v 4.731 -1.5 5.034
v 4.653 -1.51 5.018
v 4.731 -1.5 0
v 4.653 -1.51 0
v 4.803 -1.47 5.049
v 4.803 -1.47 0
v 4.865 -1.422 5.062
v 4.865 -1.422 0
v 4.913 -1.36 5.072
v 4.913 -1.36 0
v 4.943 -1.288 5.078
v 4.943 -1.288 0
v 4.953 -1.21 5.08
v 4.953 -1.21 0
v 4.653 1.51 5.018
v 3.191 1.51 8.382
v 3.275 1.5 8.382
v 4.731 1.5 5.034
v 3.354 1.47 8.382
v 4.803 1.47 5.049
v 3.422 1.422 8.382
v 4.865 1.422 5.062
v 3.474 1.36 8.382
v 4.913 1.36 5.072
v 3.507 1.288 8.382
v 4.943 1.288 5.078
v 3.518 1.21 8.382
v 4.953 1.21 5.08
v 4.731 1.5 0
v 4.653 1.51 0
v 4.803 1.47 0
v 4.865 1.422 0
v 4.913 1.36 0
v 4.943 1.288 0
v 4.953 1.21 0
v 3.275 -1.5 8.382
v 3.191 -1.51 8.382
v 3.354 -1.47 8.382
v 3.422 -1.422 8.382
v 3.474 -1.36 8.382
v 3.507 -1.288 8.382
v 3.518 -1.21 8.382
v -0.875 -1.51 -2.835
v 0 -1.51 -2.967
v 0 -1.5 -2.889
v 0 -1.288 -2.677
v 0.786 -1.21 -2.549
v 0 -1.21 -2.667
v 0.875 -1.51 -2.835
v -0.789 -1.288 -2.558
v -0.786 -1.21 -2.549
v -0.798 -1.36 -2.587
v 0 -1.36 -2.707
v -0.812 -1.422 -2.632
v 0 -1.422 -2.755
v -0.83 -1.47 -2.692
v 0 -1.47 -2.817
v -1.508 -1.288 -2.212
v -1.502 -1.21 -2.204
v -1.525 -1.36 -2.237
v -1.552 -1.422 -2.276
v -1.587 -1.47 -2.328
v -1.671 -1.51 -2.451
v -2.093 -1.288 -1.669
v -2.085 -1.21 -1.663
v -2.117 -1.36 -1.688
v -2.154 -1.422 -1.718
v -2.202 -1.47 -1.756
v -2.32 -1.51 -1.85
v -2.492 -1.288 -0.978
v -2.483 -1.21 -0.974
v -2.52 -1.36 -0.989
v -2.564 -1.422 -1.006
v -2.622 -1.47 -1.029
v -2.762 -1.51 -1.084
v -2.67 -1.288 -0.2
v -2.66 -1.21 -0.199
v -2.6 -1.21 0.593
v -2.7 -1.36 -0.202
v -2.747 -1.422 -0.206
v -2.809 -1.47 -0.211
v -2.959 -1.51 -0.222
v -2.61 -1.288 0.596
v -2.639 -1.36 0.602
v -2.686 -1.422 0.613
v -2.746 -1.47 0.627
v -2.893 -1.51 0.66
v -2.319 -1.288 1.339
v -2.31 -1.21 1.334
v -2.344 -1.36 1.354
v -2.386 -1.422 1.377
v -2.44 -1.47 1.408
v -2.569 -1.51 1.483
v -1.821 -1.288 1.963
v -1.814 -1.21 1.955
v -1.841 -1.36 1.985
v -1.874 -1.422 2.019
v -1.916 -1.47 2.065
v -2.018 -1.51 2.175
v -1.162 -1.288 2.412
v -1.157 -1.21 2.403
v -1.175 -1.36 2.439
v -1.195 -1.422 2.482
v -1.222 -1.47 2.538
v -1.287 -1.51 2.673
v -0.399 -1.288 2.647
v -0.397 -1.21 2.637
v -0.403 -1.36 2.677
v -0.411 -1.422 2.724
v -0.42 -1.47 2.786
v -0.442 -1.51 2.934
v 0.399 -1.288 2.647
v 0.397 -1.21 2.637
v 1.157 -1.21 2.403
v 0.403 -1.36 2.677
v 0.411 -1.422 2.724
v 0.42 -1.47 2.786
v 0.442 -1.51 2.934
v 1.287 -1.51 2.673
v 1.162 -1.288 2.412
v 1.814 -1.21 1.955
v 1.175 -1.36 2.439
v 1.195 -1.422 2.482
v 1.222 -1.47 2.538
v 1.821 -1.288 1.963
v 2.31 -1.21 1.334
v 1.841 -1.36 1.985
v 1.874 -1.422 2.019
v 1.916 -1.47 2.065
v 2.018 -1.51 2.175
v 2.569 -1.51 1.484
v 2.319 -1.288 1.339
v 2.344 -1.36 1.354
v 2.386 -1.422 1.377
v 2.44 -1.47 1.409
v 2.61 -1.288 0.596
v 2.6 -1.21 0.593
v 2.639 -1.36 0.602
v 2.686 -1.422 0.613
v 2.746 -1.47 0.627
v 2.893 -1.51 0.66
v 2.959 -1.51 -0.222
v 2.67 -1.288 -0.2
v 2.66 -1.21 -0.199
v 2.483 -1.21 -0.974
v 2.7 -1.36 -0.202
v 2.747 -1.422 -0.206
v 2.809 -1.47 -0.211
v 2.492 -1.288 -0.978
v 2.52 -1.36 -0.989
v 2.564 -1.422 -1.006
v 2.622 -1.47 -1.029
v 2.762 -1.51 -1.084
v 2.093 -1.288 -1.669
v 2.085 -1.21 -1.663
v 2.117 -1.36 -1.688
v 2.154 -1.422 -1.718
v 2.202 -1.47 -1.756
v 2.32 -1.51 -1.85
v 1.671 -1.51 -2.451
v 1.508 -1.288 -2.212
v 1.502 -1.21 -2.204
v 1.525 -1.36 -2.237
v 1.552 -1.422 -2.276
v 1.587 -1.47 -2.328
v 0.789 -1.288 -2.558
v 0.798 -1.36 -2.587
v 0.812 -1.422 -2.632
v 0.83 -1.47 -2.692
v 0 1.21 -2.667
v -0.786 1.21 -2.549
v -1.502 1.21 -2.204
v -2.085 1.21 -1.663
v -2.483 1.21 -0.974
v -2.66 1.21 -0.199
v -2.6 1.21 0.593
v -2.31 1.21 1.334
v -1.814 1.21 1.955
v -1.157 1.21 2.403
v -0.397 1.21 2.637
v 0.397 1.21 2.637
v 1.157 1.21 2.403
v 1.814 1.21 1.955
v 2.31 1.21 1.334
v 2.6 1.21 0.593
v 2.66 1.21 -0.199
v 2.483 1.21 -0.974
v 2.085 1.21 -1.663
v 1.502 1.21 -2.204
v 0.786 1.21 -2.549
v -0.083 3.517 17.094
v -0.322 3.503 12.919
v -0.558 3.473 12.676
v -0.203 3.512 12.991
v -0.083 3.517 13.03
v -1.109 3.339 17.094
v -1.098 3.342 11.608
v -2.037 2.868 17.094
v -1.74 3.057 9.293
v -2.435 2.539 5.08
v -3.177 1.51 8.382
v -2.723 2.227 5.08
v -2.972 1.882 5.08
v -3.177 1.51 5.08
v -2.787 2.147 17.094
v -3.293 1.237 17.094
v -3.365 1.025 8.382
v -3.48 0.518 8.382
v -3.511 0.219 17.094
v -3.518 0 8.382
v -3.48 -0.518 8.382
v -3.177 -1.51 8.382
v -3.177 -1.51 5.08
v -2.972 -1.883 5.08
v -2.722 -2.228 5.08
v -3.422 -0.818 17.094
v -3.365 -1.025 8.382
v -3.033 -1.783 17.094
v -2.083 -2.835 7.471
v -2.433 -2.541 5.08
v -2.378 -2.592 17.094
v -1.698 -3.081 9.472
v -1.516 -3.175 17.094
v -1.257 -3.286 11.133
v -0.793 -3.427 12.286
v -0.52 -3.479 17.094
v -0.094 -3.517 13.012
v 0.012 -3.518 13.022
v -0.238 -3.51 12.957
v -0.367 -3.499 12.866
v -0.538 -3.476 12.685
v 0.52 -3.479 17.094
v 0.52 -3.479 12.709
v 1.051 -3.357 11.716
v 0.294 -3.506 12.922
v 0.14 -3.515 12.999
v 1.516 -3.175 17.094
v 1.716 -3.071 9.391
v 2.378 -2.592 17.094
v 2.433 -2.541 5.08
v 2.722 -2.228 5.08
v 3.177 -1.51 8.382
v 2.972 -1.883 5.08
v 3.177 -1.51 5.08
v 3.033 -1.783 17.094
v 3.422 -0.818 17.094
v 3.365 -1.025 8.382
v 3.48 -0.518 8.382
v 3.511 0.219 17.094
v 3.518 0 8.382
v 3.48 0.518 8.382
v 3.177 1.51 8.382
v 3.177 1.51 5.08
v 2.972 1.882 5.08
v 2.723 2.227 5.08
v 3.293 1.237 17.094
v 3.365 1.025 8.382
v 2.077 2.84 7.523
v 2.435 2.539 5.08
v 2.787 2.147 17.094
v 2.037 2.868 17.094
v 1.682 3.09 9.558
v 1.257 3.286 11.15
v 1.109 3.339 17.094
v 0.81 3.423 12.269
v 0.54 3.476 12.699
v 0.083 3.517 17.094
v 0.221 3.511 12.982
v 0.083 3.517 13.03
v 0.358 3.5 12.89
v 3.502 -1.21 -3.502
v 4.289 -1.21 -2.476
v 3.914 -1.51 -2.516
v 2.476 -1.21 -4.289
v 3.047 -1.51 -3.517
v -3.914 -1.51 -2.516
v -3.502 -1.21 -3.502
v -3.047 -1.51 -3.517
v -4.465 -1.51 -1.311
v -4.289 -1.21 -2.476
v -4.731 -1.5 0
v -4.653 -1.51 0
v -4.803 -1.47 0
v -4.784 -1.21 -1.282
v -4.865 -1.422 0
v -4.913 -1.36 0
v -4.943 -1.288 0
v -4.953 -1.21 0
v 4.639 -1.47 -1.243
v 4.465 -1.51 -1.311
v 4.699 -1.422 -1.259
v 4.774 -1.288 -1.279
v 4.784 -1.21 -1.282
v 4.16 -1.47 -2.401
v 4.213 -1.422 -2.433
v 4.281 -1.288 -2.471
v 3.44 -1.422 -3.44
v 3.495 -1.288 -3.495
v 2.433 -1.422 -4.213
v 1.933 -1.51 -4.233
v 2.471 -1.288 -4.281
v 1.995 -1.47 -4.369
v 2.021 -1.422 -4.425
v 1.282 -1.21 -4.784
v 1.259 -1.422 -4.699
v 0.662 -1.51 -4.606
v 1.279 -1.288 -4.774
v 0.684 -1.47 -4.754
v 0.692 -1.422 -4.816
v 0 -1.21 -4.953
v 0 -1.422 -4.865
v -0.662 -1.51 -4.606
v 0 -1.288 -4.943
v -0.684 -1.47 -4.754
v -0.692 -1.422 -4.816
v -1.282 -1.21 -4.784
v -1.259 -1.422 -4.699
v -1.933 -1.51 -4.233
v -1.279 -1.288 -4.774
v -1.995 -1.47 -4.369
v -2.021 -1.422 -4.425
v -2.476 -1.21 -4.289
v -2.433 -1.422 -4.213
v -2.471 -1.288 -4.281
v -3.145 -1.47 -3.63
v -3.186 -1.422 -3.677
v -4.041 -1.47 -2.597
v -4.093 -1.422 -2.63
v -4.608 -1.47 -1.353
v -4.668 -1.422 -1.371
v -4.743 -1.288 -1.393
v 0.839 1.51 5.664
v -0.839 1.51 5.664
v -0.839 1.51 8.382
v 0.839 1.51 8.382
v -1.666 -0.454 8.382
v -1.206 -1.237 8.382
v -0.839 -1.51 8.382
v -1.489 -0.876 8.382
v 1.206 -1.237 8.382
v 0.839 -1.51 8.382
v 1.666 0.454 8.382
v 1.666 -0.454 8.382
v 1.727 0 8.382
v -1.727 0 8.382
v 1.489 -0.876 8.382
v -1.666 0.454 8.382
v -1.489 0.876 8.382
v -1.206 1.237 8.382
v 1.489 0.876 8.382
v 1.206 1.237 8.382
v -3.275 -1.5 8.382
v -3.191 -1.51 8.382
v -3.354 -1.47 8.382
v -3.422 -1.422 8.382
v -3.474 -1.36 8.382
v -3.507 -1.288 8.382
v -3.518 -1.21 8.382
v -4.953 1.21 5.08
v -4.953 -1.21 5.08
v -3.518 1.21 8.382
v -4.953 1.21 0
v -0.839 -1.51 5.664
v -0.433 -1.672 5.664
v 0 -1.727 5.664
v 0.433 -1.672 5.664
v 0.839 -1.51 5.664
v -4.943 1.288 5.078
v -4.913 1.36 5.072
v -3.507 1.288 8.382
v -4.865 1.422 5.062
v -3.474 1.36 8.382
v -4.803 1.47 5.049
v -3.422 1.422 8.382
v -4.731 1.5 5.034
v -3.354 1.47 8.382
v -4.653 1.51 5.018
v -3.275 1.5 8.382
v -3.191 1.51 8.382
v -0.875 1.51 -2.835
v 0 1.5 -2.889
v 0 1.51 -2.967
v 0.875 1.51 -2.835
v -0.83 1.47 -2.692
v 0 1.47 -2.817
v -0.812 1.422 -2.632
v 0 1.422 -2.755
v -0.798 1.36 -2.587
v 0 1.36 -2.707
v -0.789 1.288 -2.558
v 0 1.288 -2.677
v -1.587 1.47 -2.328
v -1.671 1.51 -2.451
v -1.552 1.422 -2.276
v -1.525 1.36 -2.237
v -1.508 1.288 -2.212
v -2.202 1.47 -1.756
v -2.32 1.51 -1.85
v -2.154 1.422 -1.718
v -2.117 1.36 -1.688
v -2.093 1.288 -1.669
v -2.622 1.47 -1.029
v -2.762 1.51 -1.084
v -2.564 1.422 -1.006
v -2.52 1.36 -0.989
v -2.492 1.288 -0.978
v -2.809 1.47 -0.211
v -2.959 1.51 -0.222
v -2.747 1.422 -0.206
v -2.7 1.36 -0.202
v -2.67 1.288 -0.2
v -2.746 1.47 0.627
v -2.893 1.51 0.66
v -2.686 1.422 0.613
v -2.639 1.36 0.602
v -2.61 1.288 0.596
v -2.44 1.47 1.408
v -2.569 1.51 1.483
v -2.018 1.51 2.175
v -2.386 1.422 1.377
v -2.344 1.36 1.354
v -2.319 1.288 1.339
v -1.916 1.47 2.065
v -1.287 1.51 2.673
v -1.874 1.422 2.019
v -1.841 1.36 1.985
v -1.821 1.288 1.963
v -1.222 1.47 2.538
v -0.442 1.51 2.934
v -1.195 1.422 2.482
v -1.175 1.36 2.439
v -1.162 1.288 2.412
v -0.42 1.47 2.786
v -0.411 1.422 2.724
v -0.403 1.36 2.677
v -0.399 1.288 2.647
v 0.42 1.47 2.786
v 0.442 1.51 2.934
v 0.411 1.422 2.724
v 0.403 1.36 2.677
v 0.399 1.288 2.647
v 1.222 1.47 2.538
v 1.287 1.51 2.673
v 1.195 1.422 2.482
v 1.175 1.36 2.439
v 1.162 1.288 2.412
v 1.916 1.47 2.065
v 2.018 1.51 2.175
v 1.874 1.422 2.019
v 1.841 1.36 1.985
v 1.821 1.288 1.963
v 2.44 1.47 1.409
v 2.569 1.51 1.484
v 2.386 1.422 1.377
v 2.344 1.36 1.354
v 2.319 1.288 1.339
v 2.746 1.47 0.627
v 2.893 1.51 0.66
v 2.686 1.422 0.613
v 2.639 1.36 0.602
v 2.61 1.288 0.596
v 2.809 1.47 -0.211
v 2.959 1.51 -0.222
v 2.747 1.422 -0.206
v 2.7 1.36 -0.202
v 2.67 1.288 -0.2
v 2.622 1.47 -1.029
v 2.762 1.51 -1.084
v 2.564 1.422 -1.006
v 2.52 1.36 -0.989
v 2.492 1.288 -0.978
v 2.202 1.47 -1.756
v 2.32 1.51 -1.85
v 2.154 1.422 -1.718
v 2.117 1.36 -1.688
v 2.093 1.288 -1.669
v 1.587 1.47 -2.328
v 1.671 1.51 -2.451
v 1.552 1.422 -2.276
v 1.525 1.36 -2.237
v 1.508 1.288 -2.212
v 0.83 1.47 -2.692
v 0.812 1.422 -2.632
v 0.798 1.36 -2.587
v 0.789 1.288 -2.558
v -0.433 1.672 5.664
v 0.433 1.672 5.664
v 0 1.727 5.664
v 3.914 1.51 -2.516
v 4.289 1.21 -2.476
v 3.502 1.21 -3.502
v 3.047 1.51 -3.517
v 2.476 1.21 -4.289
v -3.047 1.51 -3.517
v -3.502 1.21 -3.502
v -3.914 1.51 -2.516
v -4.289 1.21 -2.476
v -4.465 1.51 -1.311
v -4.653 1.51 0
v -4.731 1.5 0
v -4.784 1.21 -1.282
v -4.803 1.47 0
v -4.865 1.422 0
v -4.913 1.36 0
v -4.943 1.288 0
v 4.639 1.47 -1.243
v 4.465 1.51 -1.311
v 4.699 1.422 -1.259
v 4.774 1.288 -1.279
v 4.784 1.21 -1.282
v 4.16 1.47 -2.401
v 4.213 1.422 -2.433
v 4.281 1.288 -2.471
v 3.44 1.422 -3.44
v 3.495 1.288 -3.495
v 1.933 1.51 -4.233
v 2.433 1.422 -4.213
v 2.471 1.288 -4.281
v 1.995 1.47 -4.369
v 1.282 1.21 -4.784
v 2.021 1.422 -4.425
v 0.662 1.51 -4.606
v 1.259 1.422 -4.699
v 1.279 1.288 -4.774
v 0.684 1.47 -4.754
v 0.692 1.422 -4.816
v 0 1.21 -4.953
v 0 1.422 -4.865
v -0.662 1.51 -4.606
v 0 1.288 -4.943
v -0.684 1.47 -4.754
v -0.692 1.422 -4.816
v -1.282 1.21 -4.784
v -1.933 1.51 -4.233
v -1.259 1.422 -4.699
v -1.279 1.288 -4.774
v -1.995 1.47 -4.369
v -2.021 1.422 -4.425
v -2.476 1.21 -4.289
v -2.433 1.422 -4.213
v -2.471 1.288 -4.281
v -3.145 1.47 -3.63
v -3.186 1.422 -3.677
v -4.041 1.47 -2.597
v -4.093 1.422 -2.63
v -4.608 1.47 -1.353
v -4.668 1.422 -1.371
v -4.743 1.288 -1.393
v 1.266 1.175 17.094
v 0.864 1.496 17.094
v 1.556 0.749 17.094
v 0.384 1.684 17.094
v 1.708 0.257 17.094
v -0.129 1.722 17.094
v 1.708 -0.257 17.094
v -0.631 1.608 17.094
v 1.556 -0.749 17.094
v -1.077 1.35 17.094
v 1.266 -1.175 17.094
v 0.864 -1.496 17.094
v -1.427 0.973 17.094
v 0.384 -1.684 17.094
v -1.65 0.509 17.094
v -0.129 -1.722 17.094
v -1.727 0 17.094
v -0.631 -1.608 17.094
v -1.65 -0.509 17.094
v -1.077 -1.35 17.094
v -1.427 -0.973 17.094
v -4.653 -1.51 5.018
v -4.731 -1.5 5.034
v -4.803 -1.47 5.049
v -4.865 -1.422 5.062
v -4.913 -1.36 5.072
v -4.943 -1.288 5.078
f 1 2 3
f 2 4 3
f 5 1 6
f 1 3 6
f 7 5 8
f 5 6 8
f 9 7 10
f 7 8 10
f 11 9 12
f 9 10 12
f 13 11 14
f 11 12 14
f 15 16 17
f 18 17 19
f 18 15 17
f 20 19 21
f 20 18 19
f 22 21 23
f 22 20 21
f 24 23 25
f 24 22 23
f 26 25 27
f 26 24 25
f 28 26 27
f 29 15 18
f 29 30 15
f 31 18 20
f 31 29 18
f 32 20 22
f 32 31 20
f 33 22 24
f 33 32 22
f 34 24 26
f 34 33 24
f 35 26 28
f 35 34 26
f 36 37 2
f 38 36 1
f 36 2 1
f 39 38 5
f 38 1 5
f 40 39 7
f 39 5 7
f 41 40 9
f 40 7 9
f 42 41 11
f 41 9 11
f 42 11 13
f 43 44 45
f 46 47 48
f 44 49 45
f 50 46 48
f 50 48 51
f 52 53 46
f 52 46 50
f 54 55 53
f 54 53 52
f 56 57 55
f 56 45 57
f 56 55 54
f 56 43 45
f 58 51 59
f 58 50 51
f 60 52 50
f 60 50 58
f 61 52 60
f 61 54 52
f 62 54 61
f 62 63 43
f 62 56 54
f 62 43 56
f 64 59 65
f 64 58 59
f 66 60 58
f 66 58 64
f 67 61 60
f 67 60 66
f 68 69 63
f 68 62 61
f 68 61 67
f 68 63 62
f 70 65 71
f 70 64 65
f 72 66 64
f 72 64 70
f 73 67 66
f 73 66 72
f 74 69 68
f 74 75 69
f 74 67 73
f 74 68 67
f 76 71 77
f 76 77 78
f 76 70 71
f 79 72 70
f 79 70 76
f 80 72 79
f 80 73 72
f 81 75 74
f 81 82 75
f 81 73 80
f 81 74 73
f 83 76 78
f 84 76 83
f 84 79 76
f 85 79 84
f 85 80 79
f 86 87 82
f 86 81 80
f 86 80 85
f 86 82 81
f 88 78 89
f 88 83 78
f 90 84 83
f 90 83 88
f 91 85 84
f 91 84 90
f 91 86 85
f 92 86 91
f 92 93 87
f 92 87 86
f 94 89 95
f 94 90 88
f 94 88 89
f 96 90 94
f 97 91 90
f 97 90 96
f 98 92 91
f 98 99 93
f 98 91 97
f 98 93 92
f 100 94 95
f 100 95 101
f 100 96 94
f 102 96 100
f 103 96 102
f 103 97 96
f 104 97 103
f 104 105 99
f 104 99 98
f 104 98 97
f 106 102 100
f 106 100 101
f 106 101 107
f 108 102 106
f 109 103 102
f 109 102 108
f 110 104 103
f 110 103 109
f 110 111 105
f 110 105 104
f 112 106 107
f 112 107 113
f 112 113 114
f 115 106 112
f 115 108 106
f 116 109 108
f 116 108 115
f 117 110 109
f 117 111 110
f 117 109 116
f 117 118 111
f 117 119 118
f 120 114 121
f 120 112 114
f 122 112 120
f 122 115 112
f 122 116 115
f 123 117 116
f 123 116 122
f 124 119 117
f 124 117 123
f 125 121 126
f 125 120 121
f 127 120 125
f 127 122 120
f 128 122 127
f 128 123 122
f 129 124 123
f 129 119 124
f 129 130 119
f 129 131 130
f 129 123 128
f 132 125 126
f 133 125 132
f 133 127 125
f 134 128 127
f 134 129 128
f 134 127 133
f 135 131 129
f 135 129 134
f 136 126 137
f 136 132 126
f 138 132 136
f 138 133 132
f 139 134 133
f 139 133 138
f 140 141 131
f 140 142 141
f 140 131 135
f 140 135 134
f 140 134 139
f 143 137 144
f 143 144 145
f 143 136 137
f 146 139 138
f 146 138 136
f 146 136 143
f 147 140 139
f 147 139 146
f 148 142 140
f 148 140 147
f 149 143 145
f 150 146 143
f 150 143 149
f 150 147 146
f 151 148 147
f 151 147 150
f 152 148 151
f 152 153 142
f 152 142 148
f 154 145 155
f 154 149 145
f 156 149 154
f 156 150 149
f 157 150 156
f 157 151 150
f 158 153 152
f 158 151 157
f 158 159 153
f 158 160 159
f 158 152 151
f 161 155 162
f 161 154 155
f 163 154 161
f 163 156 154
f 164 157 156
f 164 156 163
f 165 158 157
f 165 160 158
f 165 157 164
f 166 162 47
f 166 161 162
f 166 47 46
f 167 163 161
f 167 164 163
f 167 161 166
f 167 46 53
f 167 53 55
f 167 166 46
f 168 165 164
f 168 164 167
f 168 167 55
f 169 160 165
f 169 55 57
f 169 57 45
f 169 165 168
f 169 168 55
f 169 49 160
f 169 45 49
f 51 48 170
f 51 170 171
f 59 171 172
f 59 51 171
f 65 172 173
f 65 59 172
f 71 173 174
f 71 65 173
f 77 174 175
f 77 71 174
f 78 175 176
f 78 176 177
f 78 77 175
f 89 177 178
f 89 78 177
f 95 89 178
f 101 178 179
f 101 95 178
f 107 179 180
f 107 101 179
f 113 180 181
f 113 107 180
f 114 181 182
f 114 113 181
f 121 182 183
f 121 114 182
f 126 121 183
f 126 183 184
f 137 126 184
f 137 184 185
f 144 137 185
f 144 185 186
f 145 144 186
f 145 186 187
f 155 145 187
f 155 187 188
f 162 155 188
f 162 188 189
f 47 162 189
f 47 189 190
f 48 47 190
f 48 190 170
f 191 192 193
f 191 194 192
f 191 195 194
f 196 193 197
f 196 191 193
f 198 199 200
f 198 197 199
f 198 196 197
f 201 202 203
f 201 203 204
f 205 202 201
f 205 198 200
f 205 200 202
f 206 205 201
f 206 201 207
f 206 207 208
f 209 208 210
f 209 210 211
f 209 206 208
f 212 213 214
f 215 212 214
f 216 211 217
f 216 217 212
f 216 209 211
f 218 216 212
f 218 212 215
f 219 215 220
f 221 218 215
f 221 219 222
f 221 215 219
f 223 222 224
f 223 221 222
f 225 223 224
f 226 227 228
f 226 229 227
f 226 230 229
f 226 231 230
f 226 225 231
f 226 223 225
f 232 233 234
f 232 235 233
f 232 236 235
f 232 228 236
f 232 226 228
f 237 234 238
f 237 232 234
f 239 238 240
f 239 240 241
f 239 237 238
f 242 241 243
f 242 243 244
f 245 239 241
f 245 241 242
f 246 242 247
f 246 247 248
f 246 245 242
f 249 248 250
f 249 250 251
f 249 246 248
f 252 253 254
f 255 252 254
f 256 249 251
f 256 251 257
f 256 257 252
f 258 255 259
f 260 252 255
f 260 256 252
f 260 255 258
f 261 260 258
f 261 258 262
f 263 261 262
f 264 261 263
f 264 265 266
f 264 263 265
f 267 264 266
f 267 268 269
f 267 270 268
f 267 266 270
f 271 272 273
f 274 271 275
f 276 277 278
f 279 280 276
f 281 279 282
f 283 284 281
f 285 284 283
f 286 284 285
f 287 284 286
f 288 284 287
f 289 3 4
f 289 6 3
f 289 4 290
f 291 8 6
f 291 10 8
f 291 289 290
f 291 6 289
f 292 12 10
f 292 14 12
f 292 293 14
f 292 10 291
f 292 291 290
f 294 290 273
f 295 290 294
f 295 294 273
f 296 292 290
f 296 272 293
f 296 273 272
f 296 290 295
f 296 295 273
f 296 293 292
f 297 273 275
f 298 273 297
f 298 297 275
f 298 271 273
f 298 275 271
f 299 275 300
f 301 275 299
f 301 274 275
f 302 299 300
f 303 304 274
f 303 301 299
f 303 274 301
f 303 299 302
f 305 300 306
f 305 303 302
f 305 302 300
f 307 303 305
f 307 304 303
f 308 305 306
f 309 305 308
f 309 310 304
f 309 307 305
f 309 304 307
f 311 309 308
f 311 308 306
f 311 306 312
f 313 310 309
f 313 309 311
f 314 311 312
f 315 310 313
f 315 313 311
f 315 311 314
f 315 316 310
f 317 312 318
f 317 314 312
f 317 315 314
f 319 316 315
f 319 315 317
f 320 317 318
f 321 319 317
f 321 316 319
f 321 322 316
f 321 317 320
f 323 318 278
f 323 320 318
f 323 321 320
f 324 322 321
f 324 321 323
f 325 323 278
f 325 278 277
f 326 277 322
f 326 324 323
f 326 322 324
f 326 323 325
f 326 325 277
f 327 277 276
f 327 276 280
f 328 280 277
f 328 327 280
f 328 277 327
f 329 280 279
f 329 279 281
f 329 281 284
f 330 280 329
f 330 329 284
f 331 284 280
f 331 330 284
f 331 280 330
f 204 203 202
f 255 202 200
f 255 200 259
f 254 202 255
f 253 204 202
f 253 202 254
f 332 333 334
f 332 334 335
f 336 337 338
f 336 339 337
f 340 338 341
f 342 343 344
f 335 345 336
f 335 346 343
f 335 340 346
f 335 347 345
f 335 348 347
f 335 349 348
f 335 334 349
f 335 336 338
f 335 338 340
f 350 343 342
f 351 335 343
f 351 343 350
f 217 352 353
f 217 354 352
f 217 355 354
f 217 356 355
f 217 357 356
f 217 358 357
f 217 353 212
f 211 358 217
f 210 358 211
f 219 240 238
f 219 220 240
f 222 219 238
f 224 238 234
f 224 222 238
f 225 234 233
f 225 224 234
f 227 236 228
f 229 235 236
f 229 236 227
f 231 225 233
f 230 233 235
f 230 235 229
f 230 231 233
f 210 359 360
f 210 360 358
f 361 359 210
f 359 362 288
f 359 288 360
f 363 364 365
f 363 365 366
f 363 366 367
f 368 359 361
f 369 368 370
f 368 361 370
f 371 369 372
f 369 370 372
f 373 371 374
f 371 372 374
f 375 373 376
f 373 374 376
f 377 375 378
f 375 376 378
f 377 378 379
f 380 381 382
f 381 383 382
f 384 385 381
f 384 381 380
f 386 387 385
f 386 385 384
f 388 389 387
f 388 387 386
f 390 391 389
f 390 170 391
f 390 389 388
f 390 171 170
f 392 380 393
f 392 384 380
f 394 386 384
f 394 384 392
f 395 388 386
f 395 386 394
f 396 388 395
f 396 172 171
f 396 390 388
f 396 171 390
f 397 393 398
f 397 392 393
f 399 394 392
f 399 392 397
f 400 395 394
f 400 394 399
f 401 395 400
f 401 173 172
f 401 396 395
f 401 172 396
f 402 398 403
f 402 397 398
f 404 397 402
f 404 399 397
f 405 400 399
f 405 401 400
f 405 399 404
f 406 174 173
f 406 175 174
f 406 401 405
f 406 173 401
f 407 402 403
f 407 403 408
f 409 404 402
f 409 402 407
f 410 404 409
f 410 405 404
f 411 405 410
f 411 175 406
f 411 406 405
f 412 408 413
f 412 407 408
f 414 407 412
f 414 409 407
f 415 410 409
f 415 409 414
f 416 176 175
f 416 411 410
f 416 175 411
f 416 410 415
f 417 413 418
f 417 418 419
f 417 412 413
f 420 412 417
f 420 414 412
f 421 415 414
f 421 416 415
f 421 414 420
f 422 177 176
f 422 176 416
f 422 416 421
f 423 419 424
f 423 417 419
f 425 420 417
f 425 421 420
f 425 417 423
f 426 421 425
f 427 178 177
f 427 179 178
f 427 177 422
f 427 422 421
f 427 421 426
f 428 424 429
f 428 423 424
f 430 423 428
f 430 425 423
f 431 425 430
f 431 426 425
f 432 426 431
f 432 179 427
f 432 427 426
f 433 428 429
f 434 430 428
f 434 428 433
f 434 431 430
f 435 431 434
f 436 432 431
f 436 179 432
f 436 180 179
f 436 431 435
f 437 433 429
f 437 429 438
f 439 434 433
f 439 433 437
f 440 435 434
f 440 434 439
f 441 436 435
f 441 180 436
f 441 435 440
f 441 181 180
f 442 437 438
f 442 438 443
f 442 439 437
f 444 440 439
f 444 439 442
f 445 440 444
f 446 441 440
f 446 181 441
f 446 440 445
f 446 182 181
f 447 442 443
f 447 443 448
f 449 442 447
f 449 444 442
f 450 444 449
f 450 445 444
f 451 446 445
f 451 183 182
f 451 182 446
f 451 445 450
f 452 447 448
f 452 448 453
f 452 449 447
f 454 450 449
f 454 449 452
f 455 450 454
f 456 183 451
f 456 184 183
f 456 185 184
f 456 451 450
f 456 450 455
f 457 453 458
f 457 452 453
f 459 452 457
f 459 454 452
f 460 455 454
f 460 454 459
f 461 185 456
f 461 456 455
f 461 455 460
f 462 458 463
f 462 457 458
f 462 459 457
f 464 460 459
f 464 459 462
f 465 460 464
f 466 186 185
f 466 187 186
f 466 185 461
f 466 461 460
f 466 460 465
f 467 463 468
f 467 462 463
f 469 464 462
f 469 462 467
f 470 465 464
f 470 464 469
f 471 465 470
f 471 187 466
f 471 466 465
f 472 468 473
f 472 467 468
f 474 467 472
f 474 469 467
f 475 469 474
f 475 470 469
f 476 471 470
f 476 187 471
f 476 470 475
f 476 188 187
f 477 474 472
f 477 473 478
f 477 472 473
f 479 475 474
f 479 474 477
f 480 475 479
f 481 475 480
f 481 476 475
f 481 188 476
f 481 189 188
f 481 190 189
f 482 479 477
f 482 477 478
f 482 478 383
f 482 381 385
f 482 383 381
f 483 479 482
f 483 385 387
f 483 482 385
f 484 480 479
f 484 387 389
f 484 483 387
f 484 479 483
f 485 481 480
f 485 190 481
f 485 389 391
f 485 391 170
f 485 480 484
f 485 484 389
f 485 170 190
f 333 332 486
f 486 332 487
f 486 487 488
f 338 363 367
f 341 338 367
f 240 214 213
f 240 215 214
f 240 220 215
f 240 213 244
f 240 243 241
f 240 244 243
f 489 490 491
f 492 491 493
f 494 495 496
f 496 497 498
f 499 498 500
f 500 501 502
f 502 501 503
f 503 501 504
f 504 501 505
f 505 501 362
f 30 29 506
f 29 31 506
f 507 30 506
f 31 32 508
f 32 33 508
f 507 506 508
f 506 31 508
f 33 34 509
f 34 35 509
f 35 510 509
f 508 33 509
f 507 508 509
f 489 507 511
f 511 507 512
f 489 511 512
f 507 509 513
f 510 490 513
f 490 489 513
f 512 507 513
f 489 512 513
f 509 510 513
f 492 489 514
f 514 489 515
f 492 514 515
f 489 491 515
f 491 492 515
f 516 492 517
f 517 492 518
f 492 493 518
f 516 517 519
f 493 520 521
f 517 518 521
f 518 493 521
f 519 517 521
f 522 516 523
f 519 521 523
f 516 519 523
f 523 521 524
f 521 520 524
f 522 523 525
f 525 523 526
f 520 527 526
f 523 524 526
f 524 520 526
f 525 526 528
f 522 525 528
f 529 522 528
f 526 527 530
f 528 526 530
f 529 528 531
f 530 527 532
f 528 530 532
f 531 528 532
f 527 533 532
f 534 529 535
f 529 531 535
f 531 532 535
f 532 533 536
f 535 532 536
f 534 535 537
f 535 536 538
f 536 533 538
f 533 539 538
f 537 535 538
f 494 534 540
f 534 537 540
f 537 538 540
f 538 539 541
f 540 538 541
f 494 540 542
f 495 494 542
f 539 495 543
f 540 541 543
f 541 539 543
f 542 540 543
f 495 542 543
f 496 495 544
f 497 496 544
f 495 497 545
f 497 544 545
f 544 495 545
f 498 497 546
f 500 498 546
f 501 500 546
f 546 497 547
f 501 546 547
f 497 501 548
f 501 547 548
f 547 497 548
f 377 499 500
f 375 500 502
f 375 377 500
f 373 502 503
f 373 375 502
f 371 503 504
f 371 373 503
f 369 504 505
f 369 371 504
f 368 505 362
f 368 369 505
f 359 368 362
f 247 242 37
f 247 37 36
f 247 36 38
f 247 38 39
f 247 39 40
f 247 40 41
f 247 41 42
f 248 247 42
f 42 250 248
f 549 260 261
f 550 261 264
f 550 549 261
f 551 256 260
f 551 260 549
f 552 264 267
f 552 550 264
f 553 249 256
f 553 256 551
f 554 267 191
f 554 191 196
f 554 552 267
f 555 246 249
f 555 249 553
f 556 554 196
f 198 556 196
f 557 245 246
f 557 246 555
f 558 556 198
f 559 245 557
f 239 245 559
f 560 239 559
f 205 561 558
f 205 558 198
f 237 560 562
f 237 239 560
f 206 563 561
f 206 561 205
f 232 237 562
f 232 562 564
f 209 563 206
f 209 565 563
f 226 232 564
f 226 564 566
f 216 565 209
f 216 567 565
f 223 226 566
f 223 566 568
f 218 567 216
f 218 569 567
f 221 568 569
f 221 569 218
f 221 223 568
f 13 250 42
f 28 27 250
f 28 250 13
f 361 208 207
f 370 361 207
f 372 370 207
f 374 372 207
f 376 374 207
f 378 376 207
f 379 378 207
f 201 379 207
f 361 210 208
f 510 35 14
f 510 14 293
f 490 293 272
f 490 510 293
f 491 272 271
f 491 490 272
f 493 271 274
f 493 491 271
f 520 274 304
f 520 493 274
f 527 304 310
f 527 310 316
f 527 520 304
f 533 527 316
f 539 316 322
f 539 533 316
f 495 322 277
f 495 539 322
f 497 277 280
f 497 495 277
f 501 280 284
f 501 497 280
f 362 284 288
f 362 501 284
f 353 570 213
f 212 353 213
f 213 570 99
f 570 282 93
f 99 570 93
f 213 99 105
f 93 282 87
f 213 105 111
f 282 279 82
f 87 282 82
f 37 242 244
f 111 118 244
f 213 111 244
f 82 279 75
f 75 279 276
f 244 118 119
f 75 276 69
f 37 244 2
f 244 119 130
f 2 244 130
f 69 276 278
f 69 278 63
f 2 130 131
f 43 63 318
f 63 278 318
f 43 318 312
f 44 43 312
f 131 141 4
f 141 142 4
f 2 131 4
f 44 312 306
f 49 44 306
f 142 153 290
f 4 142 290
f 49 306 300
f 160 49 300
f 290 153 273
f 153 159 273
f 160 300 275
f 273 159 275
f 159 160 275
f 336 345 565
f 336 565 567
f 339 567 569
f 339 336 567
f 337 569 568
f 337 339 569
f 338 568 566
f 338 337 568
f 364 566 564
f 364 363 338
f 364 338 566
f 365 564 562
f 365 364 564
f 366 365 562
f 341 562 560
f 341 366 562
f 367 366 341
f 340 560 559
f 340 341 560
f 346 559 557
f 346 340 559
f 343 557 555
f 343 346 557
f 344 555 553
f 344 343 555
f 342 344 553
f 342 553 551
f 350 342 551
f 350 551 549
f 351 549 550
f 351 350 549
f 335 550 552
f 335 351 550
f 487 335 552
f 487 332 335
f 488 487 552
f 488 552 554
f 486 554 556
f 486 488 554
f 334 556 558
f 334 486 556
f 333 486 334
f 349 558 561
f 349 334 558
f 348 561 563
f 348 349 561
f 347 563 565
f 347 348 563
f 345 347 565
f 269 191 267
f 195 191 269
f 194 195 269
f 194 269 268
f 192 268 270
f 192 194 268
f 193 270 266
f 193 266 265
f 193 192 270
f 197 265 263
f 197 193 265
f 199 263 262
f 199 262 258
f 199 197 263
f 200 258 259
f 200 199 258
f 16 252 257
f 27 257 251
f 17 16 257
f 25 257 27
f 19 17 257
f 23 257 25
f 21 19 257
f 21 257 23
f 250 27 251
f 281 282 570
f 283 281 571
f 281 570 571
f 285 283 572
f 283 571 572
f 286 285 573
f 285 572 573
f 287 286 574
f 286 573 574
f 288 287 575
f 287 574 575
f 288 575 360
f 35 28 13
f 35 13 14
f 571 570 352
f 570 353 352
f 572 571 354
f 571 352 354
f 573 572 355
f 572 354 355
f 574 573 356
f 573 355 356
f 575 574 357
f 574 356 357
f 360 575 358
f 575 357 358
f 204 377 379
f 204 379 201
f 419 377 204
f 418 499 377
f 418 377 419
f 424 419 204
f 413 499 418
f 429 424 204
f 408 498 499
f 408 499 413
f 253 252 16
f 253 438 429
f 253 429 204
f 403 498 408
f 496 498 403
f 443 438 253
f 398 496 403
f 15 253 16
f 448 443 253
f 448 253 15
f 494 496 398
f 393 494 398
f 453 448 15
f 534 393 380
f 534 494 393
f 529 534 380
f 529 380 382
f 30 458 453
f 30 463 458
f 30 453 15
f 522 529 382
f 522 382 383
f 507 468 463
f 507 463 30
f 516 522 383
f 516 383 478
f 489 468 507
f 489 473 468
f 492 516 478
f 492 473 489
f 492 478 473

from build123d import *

# Parameters (mm, degrees)
CUT_EXTRUDE1_START  = -2.434961
SKETCH2_OUTSIDE_W   = 17.134
SKETCH2_OUTSIDE_H   = 12.156
CUT_EXTRUDE1_DEPTH  = 4.869922
SKETCH7_R           = 2.667
BOSS_EXTRUDE2_DEPTH = 1.51
FILLET1_R           = 0.3
FILLET2_R           = 0.3
FILLET3_R           = 0.3
FILLET4_R           = 0.3


with BuildPart() as part:
    # Sketch1 → Revolve1 (revolve)
    with BuildSketch(Plane(origin=(0, 0, 0), x_dir=(1, 0, 0), z_dir=(0, 1, 0))):
        Polygon((-3.5179, -17.0942), (-1.7272, -17.0942), (-1.7272, -5.6642), (0, -5.6642), (0, -5.08), (-3.5179, -5.08), (-3.5179, -8.382), align=None)
    revolve(axis=Axis((0, 0, 0), (0, 0, 1)))

    # Sketch2 outside → Cut-Extrude1 (cut)
    with BuildSketch(Plane(origin=(0, 0, 0), x_dir=(0, 0, -1), z_dir=(1, 0, 0)).offset(CUT_EXTRUDE1_START)):
        with Locations((-11.087, 0)):
            Rectangle(SKETCH2_OUTSIDE_W, SKETCH2_OUTSIDE_H)
        Polygon((-17.0942, -3.51888695), (-17.0942, 3.51691305), (-13.0302, 3.51691305), (-5.08, 2.53901305), (-5.08, -2.54098695), (-13.0302, -3.51888695), align=None, mode=Mode.SUBTRACT)
    extrude(amount=CUT_EXTRUDE1_DEPTH, mode=Mode.SUBTRACT)

    # Sketch7 → Boss-Extrude2 (add, symmetric)
    with BuildSketch(Plane(origin=(0, 0, 0), x_dir=(1, 0, 0), z_dir=(0, 1, 0))):
        with BuildLine():
            Line((-4.953, 0), (-4.953, -5.08))
            Line((-4.953, -5.08), (-3.5179, -8.382))
            Line((-3.5179, -8.382), (3.5179, -8.382))
            Line((3.5179, -8.382), (4.953, -5.08))
            Line((4.953, -5.08), (4.953, 0))
            ThreePointArc((4.953, 0), (0, 4.953), (-4.953, 0))
        make_face()
        with Locations(Location((0, 0, 0), (0, 0, 90))):
            Circle(SKETCH7_R, mode=Mode.SUBTRACT)
    extrude(amount=BOSS_EXTRUDE2_DEPTH, both=True)

    # Fillet1
    fillet1_edges = [part.edges().sort_by_distance(p)[0] for p in [
        (0, -1.51, -4.953),
        (-4.953, -1.51, 2.54),
        (-4.23545, -1.51, 6.731),
        (4.23545, -1.51, 6.731),
        (4.953, -1.51, 2.54),
    ]]
    fillet(fillet1_edges, radius=FILLET1_R)

    # Fillet2
    fillet2_edges = [part.edges().sort_by_distance(p)[0] for p in [
        (4.23545, 1.51, 6.731),
        (4.953, 1.51, 2.54),
        (0, 1.51, -4.953),
        (-4.953, 1.51, 2.54),
        (-4.23545, 1.51, 6.731),
    ]]
    fillet(fillet2_edges, radius=FILLET2_R)

    # Fillet3
    fillet3_edges = [part.edges().sort_by_distance(p)[0] for p in [
        (0, 1.51, 2.667),
    ]]
    fillet(fillet3_edges, radius=FILLET3_R)

    # Fillet4
    fillet4_edges = [part.edges().sort_by_distance(p)[0] for p in [
        (0, -1.51, 2.667),
    ]]
    fillet(fillet4_edges, radius=FILLET4_R)


solid = part.part
